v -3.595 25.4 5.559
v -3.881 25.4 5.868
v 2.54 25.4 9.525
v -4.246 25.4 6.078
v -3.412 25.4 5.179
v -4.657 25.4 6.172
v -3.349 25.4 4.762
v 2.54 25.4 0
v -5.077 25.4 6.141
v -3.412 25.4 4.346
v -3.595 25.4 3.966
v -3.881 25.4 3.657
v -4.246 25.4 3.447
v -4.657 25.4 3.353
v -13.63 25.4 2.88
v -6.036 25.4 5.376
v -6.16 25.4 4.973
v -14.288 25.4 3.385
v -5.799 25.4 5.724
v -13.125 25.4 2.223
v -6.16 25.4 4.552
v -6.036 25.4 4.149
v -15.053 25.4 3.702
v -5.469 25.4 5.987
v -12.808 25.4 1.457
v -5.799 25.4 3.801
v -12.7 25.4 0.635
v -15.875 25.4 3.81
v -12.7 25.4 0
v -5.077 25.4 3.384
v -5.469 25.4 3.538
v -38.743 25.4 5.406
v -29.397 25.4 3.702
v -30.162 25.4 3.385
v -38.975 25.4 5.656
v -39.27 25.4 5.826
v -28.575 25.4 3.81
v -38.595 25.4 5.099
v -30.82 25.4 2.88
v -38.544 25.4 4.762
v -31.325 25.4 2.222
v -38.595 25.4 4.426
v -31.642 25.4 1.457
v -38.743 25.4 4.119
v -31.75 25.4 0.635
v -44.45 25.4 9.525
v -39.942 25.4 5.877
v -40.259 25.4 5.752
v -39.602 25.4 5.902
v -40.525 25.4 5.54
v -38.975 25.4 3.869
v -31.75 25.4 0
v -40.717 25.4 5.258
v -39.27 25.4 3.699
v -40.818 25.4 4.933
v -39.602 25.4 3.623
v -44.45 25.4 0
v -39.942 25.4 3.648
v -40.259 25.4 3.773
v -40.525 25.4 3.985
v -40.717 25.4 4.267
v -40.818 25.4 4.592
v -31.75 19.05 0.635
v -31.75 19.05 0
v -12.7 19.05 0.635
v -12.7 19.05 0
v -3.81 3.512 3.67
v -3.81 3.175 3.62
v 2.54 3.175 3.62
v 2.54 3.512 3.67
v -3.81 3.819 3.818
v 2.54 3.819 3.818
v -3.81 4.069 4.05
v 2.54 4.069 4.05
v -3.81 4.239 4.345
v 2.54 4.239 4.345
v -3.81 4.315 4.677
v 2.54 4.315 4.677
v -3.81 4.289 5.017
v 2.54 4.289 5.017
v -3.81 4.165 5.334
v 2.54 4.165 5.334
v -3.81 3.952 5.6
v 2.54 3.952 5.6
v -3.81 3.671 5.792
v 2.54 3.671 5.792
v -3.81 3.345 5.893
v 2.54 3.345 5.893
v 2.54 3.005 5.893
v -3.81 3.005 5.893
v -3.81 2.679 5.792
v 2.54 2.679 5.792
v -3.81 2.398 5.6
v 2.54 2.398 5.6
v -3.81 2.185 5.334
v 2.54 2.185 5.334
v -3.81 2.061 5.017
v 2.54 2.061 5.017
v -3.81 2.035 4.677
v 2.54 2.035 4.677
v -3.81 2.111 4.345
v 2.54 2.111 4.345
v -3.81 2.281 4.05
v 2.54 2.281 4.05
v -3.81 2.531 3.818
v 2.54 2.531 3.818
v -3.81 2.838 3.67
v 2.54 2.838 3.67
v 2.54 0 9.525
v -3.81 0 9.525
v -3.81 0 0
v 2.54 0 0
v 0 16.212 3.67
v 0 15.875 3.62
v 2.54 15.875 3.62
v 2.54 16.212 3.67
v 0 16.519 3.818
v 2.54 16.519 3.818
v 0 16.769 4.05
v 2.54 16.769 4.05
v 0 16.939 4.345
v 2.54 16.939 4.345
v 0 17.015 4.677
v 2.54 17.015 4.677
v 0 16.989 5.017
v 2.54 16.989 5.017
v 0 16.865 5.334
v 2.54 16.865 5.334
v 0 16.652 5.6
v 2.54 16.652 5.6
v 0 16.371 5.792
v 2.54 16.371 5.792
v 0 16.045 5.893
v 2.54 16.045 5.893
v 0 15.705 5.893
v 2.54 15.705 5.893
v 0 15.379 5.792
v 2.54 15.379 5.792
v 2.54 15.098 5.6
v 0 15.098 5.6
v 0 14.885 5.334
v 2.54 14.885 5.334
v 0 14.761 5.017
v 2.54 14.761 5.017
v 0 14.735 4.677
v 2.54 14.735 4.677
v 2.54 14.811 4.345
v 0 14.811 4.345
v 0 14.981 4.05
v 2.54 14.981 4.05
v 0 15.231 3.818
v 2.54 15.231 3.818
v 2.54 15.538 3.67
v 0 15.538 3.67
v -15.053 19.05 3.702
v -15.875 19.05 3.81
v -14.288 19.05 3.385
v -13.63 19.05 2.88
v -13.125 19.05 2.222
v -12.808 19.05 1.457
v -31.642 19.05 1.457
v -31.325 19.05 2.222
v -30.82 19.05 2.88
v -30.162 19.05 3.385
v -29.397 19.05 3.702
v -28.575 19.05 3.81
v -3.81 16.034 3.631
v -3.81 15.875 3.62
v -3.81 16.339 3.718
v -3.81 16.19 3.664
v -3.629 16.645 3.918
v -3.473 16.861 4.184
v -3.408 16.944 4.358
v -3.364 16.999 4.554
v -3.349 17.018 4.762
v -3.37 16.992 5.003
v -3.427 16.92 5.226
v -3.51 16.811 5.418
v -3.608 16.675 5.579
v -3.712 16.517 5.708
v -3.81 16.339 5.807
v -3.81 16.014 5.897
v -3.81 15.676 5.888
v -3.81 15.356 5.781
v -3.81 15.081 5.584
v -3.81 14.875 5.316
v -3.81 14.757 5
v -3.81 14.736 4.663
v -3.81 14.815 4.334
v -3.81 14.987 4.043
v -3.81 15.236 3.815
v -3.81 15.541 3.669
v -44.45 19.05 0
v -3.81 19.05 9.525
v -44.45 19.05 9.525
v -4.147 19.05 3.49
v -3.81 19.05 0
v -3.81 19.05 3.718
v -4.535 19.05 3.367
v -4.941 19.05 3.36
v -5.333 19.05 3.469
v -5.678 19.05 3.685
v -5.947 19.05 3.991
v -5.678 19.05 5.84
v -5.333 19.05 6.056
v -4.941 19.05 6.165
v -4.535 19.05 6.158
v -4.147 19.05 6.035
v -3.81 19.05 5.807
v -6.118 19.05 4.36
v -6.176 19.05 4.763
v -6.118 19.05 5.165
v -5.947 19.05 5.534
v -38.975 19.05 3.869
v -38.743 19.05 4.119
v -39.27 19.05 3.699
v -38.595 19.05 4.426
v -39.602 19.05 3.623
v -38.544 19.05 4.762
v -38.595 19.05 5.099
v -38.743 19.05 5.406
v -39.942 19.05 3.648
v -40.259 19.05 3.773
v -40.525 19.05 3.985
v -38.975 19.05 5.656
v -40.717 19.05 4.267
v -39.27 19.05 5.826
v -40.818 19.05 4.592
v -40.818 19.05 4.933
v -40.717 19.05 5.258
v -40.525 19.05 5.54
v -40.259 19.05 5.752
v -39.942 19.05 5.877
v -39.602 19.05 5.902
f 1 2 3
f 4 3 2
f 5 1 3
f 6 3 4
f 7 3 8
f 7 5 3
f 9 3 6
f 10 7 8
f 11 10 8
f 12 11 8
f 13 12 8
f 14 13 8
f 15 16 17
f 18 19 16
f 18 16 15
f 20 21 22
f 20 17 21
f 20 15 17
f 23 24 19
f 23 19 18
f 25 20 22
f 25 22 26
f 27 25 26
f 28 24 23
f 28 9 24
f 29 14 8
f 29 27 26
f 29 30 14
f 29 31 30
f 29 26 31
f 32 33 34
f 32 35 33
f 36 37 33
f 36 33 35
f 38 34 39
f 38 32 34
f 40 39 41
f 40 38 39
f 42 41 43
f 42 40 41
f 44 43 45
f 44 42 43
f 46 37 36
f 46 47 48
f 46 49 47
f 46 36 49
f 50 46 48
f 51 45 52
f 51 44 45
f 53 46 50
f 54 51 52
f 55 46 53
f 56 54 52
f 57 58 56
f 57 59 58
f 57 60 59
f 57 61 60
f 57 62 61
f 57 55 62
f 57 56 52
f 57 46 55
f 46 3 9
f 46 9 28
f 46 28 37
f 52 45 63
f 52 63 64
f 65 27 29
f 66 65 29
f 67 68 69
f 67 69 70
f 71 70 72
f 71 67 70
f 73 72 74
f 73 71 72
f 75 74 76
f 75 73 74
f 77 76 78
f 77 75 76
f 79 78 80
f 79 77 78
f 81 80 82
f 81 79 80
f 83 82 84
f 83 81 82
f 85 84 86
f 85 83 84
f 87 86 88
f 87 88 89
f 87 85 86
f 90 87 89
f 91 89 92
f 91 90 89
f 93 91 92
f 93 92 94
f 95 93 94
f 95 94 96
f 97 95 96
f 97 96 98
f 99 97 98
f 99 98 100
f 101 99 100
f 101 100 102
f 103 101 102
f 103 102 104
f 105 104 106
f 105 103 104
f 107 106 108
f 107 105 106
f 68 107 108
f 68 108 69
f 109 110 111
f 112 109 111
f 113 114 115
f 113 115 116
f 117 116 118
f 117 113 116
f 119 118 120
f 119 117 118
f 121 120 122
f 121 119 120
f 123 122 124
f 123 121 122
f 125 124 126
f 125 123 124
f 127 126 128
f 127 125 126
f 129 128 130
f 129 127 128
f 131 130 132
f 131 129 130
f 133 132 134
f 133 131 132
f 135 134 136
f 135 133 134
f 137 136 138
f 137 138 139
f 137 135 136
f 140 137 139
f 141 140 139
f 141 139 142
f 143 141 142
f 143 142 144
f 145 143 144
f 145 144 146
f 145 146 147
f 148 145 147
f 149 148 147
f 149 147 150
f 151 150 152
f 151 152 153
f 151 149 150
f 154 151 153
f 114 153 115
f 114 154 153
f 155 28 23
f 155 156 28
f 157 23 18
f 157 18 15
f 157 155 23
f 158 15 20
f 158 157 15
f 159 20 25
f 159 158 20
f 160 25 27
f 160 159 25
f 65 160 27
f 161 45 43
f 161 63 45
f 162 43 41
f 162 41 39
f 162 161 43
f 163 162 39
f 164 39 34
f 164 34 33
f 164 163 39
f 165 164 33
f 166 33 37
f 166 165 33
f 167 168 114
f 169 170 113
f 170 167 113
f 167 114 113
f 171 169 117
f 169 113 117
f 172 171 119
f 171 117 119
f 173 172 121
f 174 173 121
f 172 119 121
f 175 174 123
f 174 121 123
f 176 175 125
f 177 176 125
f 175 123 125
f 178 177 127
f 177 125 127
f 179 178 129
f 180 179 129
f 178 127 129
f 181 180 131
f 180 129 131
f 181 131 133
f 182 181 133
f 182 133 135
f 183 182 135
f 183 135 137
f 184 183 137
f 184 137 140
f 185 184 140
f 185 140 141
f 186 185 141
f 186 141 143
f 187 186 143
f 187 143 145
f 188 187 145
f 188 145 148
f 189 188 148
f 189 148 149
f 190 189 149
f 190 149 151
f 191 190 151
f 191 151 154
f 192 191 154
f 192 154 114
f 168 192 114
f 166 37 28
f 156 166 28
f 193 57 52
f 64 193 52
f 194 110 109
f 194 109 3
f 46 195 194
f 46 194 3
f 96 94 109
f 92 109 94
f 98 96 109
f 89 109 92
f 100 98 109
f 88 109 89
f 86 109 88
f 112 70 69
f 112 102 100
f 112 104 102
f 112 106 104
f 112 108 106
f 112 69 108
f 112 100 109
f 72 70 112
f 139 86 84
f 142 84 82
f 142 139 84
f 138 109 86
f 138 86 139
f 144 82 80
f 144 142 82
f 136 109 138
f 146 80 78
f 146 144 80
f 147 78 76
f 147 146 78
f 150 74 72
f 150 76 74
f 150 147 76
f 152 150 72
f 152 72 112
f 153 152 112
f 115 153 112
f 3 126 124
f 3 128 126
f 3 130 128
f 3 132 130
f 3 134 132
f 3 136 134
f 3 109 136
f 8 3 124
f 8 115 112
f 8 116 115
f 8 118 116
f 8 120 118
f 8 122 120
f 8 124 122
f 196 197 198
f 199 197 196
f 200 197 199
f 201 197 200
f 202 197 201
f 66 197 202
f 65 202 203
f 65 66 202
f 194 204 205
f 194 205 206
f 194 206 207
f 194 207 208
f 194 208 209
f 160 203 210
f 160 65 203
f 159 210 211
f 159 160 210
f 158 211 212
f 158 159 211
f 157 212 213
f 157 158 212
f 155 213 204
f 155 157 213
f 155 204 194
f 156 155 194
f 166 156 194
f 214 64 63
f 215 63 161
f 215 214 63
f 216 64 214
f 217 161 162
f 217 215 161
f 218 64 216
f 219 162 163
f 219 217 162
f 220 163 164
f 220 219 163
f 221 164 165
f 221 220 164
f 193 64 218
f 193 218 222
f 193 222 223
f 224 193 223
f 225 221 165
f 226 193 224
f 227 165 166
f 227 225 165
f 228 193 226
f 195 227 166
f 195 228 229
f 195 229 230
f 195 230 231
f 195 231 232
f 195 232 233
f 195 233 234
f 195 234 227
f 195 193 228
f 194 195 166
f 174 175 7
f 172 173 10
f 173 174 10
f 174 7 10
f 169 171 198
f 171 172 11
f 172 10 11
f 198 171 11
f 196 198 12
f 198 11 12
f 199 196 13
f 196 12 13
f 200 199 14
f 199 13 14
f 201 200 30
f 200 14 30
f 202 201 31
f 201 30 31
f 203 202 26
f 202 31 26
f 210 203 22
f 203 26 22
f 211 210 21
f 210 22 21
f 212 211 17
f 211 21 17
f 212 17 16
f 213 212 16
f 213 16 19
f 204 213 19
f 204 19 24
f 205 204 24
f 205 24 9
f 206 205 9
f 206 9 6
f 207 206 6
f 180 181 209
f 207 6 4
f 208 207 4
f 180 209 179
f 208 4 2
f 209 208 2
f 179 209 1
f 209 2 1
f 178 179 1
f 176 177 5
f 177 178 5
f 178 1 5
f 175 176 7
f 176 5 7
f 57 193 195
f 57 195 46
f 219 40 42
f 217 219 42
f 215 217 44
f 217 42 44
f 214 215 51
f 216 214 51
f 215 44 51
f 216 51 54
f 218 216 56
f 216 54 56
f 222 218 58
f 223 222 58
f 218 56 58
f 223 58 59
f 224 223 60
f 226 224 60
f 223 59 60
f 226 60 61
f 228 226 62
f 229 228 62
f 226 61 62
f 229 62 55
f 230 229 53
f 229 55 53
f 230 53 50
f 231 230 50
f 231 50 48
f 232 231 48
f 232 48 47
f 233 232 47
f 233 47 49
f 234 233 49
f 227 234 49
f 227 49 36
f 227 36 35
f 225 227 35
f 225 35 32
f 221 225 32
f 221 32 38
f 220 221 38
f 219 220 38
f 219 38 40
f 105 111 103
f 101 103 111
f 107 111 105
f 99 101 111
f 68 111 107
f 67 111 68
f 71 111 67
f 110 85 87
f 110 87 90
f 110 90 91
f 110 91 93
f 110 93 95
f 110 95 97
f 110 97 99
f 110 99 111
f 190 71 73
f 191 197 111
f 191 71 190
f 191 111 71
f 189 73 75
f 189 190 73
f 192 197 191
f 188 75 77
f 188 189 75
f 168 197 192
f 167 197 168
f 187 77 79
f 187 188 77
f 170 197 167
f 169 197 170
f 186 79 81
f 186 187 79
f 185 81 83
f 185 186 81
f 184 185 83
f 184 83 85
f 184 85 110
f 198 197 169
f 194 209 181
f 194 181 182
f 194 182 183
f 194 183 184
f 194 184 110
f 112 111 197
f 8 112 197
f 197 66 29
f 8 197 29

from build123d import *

# Parameters (mm, degrees)
SKETCH3_W           = 44.45
SKETCH3_H           = 25.4
BOSS_EXTRUDE2_DEPTH = 9.525
SKETCH4_W           = 34.925
SKETCH4_H           = 15.875
CUT_EXTRUDE1_DEPTH  = 10.525
SKETCH5_R           = 1.143
CUT_EXTRUDE2_DEPTH  = 9.525
SKETCH6_W           = 34.925
SKETCH6_H           = 9.525
CUT_EXTRUDE3_DEPTH  = 3.175
SKETCH7_W           = 19.05
SKETCH7_H           = 3.81
CUT_EXTRUDE4_DEPTH  = 26.4
FILLET1_R           = 3.175
SKETCH8_R           = 1.143
SKETCH8_R_2         = 1.41354867
CUT_EXTRUDE5_DEPTH  = 9.525
SKETCH9_W           = 9.525
SKETCH9_H           = 25.4
SKETCH9_R           = 1.143
BOSS_EXTRUDE3_DEPTH = 2.54
SKETCH10_W          = 9.525
SKETCH10_H          = 19.05
SKETCH10_R          = 1.143
CUT_EXTRUDE6_DEPTH  = 5.715


with BuildPart() as part:
    # Sketch3 → Boss-Extrude2 (new body)
    with BuildSketch(Plane.XY):
        with Locations((-22.225, 12.7)):
            Rectangle(SKETCH3_W, SKETCH3_H)
    extrude(amount=BOSS_EXTRUDE2_DEPTH)

    # Sketch4 → Cut-Extrude1 (cut, through all)
    with BuildSketch(Plane.XY.offset(9.525)):
        with Locations((-26.9875, 7.9375)):
            Rectangle(SKETCH4_W, SKETCH4_H)
    extrude(amount=-CUT_EXTRUDE1_DEPTH, mode=Mode.SUBTRACT)

    # Sketch5 → Cut-Extrude2 (cut)
    with BuildSketch(Plane(origin=(0, 0, 0), x_dir=(0, 0, -1), z_dir=(1, 0, 0))):
        with Locations((-4.7625, 3.175)):
            Circle(SKETCH5_R)
        with Locations((-4.7625, 15.875)):
            Circle(SKETCH5_R)
    extrude(amount=-CUT_EXTRUDE2_DEPTH, mode=Mode.SUBTRACT)

    # Sketch6 → Cut-Extrude3 (cut)
    with BuildSketch(Plane.XZ.offset(-15.875)):
        with Locations((-26.9875, 4.7625)):
            Rectangle(SKETCH6_W, SKETCH6_H)
    extrude(amount=-CUT_EXTRUDE3_DEPTH, mode=Mode.SUBTRACT)

    # Sketch7 → Cut-Extrude4 (cut, through all)
    with BuildSketch(Plane(origin=(0, 25.4, 0), x_dir=(1, 0, 0), z_dir=(0, 1, 0))):
        with Locations((-22.225, -1.905)):
            Rectangle(SKETCH7_W, SKETCH7_H)
    extrude(amount=-CUT_EXTRUDE4_DEPTH, mode=Mode.SUBTRACT)

    # Fillet1
    fillet1_edges = [part.edges().sort_by_distance(p)[0] for p in [
        (-12.7, 22.225, 3.81),
        (-31.75, 22.225, 3.81),
    ]]
    fillet(fillet1_edges, radius=FILLET1_R)

    # Sketch8 → Cut-Extrude5 (cut)
    with BuildSketch(Plane(origin=(0, 25.4, 0), x_dir=(1, 0, 0), z_dir=(0, 1, 0))):
        with Locations((-39.6875, -4.7625)):
            Circle(SKETCH8_R)
        with Locations((-4.7625, -4.7625)):
            Circle(SKETCH8_R_2)
    extrude(amount=-CUT_EXTRUDE5_DEPTH, mode=Mode.SUBTRACT)

    # Sketch9 → Boss-Extrude3 (add)
    with BuildSketch(Plane(origin=(0, 0, 0), x_dir=(0, 0, -1), z_dir=(1, 0, 0))):
        with Locations((-4.7625, 12.7)):
            Rectangle(SKETCH9_W, SKETCH9_H)
        with Locations((-4.7625, 15.875)):
            Circle(SKETCH9_R, mode=Mode.SUBTRACT)
        with Locations((-4.7625, 3.175)):
            Circle(SKETCH9_R, mode=Mode.SUBTRACT)
    extrude(amount=BOSS_EXTRUDE3_DEPTH)

    # Sketch10 → Cut-Extrude6 (cut)
    with BuildSketch(Plane.ZY.offset(9.525)):
        with Locations((4.7625, 9.525)):
            Rectangle(SKETCH10_W, SKETCH10_H)
        with Locations((4.7625, 15.875)):
            Circle(SKETCH10_R, mode=Mode.SUBTRACT)
        with Locations((4.7625, 3.175)):
            Circle(SKETCH10_R, mode=Mode.SUBTRACT)
    extrude(amount=-CUT_EXTRUDE6_DEPTH, mode=Mode.SUBTRACT)


solid = part.part
